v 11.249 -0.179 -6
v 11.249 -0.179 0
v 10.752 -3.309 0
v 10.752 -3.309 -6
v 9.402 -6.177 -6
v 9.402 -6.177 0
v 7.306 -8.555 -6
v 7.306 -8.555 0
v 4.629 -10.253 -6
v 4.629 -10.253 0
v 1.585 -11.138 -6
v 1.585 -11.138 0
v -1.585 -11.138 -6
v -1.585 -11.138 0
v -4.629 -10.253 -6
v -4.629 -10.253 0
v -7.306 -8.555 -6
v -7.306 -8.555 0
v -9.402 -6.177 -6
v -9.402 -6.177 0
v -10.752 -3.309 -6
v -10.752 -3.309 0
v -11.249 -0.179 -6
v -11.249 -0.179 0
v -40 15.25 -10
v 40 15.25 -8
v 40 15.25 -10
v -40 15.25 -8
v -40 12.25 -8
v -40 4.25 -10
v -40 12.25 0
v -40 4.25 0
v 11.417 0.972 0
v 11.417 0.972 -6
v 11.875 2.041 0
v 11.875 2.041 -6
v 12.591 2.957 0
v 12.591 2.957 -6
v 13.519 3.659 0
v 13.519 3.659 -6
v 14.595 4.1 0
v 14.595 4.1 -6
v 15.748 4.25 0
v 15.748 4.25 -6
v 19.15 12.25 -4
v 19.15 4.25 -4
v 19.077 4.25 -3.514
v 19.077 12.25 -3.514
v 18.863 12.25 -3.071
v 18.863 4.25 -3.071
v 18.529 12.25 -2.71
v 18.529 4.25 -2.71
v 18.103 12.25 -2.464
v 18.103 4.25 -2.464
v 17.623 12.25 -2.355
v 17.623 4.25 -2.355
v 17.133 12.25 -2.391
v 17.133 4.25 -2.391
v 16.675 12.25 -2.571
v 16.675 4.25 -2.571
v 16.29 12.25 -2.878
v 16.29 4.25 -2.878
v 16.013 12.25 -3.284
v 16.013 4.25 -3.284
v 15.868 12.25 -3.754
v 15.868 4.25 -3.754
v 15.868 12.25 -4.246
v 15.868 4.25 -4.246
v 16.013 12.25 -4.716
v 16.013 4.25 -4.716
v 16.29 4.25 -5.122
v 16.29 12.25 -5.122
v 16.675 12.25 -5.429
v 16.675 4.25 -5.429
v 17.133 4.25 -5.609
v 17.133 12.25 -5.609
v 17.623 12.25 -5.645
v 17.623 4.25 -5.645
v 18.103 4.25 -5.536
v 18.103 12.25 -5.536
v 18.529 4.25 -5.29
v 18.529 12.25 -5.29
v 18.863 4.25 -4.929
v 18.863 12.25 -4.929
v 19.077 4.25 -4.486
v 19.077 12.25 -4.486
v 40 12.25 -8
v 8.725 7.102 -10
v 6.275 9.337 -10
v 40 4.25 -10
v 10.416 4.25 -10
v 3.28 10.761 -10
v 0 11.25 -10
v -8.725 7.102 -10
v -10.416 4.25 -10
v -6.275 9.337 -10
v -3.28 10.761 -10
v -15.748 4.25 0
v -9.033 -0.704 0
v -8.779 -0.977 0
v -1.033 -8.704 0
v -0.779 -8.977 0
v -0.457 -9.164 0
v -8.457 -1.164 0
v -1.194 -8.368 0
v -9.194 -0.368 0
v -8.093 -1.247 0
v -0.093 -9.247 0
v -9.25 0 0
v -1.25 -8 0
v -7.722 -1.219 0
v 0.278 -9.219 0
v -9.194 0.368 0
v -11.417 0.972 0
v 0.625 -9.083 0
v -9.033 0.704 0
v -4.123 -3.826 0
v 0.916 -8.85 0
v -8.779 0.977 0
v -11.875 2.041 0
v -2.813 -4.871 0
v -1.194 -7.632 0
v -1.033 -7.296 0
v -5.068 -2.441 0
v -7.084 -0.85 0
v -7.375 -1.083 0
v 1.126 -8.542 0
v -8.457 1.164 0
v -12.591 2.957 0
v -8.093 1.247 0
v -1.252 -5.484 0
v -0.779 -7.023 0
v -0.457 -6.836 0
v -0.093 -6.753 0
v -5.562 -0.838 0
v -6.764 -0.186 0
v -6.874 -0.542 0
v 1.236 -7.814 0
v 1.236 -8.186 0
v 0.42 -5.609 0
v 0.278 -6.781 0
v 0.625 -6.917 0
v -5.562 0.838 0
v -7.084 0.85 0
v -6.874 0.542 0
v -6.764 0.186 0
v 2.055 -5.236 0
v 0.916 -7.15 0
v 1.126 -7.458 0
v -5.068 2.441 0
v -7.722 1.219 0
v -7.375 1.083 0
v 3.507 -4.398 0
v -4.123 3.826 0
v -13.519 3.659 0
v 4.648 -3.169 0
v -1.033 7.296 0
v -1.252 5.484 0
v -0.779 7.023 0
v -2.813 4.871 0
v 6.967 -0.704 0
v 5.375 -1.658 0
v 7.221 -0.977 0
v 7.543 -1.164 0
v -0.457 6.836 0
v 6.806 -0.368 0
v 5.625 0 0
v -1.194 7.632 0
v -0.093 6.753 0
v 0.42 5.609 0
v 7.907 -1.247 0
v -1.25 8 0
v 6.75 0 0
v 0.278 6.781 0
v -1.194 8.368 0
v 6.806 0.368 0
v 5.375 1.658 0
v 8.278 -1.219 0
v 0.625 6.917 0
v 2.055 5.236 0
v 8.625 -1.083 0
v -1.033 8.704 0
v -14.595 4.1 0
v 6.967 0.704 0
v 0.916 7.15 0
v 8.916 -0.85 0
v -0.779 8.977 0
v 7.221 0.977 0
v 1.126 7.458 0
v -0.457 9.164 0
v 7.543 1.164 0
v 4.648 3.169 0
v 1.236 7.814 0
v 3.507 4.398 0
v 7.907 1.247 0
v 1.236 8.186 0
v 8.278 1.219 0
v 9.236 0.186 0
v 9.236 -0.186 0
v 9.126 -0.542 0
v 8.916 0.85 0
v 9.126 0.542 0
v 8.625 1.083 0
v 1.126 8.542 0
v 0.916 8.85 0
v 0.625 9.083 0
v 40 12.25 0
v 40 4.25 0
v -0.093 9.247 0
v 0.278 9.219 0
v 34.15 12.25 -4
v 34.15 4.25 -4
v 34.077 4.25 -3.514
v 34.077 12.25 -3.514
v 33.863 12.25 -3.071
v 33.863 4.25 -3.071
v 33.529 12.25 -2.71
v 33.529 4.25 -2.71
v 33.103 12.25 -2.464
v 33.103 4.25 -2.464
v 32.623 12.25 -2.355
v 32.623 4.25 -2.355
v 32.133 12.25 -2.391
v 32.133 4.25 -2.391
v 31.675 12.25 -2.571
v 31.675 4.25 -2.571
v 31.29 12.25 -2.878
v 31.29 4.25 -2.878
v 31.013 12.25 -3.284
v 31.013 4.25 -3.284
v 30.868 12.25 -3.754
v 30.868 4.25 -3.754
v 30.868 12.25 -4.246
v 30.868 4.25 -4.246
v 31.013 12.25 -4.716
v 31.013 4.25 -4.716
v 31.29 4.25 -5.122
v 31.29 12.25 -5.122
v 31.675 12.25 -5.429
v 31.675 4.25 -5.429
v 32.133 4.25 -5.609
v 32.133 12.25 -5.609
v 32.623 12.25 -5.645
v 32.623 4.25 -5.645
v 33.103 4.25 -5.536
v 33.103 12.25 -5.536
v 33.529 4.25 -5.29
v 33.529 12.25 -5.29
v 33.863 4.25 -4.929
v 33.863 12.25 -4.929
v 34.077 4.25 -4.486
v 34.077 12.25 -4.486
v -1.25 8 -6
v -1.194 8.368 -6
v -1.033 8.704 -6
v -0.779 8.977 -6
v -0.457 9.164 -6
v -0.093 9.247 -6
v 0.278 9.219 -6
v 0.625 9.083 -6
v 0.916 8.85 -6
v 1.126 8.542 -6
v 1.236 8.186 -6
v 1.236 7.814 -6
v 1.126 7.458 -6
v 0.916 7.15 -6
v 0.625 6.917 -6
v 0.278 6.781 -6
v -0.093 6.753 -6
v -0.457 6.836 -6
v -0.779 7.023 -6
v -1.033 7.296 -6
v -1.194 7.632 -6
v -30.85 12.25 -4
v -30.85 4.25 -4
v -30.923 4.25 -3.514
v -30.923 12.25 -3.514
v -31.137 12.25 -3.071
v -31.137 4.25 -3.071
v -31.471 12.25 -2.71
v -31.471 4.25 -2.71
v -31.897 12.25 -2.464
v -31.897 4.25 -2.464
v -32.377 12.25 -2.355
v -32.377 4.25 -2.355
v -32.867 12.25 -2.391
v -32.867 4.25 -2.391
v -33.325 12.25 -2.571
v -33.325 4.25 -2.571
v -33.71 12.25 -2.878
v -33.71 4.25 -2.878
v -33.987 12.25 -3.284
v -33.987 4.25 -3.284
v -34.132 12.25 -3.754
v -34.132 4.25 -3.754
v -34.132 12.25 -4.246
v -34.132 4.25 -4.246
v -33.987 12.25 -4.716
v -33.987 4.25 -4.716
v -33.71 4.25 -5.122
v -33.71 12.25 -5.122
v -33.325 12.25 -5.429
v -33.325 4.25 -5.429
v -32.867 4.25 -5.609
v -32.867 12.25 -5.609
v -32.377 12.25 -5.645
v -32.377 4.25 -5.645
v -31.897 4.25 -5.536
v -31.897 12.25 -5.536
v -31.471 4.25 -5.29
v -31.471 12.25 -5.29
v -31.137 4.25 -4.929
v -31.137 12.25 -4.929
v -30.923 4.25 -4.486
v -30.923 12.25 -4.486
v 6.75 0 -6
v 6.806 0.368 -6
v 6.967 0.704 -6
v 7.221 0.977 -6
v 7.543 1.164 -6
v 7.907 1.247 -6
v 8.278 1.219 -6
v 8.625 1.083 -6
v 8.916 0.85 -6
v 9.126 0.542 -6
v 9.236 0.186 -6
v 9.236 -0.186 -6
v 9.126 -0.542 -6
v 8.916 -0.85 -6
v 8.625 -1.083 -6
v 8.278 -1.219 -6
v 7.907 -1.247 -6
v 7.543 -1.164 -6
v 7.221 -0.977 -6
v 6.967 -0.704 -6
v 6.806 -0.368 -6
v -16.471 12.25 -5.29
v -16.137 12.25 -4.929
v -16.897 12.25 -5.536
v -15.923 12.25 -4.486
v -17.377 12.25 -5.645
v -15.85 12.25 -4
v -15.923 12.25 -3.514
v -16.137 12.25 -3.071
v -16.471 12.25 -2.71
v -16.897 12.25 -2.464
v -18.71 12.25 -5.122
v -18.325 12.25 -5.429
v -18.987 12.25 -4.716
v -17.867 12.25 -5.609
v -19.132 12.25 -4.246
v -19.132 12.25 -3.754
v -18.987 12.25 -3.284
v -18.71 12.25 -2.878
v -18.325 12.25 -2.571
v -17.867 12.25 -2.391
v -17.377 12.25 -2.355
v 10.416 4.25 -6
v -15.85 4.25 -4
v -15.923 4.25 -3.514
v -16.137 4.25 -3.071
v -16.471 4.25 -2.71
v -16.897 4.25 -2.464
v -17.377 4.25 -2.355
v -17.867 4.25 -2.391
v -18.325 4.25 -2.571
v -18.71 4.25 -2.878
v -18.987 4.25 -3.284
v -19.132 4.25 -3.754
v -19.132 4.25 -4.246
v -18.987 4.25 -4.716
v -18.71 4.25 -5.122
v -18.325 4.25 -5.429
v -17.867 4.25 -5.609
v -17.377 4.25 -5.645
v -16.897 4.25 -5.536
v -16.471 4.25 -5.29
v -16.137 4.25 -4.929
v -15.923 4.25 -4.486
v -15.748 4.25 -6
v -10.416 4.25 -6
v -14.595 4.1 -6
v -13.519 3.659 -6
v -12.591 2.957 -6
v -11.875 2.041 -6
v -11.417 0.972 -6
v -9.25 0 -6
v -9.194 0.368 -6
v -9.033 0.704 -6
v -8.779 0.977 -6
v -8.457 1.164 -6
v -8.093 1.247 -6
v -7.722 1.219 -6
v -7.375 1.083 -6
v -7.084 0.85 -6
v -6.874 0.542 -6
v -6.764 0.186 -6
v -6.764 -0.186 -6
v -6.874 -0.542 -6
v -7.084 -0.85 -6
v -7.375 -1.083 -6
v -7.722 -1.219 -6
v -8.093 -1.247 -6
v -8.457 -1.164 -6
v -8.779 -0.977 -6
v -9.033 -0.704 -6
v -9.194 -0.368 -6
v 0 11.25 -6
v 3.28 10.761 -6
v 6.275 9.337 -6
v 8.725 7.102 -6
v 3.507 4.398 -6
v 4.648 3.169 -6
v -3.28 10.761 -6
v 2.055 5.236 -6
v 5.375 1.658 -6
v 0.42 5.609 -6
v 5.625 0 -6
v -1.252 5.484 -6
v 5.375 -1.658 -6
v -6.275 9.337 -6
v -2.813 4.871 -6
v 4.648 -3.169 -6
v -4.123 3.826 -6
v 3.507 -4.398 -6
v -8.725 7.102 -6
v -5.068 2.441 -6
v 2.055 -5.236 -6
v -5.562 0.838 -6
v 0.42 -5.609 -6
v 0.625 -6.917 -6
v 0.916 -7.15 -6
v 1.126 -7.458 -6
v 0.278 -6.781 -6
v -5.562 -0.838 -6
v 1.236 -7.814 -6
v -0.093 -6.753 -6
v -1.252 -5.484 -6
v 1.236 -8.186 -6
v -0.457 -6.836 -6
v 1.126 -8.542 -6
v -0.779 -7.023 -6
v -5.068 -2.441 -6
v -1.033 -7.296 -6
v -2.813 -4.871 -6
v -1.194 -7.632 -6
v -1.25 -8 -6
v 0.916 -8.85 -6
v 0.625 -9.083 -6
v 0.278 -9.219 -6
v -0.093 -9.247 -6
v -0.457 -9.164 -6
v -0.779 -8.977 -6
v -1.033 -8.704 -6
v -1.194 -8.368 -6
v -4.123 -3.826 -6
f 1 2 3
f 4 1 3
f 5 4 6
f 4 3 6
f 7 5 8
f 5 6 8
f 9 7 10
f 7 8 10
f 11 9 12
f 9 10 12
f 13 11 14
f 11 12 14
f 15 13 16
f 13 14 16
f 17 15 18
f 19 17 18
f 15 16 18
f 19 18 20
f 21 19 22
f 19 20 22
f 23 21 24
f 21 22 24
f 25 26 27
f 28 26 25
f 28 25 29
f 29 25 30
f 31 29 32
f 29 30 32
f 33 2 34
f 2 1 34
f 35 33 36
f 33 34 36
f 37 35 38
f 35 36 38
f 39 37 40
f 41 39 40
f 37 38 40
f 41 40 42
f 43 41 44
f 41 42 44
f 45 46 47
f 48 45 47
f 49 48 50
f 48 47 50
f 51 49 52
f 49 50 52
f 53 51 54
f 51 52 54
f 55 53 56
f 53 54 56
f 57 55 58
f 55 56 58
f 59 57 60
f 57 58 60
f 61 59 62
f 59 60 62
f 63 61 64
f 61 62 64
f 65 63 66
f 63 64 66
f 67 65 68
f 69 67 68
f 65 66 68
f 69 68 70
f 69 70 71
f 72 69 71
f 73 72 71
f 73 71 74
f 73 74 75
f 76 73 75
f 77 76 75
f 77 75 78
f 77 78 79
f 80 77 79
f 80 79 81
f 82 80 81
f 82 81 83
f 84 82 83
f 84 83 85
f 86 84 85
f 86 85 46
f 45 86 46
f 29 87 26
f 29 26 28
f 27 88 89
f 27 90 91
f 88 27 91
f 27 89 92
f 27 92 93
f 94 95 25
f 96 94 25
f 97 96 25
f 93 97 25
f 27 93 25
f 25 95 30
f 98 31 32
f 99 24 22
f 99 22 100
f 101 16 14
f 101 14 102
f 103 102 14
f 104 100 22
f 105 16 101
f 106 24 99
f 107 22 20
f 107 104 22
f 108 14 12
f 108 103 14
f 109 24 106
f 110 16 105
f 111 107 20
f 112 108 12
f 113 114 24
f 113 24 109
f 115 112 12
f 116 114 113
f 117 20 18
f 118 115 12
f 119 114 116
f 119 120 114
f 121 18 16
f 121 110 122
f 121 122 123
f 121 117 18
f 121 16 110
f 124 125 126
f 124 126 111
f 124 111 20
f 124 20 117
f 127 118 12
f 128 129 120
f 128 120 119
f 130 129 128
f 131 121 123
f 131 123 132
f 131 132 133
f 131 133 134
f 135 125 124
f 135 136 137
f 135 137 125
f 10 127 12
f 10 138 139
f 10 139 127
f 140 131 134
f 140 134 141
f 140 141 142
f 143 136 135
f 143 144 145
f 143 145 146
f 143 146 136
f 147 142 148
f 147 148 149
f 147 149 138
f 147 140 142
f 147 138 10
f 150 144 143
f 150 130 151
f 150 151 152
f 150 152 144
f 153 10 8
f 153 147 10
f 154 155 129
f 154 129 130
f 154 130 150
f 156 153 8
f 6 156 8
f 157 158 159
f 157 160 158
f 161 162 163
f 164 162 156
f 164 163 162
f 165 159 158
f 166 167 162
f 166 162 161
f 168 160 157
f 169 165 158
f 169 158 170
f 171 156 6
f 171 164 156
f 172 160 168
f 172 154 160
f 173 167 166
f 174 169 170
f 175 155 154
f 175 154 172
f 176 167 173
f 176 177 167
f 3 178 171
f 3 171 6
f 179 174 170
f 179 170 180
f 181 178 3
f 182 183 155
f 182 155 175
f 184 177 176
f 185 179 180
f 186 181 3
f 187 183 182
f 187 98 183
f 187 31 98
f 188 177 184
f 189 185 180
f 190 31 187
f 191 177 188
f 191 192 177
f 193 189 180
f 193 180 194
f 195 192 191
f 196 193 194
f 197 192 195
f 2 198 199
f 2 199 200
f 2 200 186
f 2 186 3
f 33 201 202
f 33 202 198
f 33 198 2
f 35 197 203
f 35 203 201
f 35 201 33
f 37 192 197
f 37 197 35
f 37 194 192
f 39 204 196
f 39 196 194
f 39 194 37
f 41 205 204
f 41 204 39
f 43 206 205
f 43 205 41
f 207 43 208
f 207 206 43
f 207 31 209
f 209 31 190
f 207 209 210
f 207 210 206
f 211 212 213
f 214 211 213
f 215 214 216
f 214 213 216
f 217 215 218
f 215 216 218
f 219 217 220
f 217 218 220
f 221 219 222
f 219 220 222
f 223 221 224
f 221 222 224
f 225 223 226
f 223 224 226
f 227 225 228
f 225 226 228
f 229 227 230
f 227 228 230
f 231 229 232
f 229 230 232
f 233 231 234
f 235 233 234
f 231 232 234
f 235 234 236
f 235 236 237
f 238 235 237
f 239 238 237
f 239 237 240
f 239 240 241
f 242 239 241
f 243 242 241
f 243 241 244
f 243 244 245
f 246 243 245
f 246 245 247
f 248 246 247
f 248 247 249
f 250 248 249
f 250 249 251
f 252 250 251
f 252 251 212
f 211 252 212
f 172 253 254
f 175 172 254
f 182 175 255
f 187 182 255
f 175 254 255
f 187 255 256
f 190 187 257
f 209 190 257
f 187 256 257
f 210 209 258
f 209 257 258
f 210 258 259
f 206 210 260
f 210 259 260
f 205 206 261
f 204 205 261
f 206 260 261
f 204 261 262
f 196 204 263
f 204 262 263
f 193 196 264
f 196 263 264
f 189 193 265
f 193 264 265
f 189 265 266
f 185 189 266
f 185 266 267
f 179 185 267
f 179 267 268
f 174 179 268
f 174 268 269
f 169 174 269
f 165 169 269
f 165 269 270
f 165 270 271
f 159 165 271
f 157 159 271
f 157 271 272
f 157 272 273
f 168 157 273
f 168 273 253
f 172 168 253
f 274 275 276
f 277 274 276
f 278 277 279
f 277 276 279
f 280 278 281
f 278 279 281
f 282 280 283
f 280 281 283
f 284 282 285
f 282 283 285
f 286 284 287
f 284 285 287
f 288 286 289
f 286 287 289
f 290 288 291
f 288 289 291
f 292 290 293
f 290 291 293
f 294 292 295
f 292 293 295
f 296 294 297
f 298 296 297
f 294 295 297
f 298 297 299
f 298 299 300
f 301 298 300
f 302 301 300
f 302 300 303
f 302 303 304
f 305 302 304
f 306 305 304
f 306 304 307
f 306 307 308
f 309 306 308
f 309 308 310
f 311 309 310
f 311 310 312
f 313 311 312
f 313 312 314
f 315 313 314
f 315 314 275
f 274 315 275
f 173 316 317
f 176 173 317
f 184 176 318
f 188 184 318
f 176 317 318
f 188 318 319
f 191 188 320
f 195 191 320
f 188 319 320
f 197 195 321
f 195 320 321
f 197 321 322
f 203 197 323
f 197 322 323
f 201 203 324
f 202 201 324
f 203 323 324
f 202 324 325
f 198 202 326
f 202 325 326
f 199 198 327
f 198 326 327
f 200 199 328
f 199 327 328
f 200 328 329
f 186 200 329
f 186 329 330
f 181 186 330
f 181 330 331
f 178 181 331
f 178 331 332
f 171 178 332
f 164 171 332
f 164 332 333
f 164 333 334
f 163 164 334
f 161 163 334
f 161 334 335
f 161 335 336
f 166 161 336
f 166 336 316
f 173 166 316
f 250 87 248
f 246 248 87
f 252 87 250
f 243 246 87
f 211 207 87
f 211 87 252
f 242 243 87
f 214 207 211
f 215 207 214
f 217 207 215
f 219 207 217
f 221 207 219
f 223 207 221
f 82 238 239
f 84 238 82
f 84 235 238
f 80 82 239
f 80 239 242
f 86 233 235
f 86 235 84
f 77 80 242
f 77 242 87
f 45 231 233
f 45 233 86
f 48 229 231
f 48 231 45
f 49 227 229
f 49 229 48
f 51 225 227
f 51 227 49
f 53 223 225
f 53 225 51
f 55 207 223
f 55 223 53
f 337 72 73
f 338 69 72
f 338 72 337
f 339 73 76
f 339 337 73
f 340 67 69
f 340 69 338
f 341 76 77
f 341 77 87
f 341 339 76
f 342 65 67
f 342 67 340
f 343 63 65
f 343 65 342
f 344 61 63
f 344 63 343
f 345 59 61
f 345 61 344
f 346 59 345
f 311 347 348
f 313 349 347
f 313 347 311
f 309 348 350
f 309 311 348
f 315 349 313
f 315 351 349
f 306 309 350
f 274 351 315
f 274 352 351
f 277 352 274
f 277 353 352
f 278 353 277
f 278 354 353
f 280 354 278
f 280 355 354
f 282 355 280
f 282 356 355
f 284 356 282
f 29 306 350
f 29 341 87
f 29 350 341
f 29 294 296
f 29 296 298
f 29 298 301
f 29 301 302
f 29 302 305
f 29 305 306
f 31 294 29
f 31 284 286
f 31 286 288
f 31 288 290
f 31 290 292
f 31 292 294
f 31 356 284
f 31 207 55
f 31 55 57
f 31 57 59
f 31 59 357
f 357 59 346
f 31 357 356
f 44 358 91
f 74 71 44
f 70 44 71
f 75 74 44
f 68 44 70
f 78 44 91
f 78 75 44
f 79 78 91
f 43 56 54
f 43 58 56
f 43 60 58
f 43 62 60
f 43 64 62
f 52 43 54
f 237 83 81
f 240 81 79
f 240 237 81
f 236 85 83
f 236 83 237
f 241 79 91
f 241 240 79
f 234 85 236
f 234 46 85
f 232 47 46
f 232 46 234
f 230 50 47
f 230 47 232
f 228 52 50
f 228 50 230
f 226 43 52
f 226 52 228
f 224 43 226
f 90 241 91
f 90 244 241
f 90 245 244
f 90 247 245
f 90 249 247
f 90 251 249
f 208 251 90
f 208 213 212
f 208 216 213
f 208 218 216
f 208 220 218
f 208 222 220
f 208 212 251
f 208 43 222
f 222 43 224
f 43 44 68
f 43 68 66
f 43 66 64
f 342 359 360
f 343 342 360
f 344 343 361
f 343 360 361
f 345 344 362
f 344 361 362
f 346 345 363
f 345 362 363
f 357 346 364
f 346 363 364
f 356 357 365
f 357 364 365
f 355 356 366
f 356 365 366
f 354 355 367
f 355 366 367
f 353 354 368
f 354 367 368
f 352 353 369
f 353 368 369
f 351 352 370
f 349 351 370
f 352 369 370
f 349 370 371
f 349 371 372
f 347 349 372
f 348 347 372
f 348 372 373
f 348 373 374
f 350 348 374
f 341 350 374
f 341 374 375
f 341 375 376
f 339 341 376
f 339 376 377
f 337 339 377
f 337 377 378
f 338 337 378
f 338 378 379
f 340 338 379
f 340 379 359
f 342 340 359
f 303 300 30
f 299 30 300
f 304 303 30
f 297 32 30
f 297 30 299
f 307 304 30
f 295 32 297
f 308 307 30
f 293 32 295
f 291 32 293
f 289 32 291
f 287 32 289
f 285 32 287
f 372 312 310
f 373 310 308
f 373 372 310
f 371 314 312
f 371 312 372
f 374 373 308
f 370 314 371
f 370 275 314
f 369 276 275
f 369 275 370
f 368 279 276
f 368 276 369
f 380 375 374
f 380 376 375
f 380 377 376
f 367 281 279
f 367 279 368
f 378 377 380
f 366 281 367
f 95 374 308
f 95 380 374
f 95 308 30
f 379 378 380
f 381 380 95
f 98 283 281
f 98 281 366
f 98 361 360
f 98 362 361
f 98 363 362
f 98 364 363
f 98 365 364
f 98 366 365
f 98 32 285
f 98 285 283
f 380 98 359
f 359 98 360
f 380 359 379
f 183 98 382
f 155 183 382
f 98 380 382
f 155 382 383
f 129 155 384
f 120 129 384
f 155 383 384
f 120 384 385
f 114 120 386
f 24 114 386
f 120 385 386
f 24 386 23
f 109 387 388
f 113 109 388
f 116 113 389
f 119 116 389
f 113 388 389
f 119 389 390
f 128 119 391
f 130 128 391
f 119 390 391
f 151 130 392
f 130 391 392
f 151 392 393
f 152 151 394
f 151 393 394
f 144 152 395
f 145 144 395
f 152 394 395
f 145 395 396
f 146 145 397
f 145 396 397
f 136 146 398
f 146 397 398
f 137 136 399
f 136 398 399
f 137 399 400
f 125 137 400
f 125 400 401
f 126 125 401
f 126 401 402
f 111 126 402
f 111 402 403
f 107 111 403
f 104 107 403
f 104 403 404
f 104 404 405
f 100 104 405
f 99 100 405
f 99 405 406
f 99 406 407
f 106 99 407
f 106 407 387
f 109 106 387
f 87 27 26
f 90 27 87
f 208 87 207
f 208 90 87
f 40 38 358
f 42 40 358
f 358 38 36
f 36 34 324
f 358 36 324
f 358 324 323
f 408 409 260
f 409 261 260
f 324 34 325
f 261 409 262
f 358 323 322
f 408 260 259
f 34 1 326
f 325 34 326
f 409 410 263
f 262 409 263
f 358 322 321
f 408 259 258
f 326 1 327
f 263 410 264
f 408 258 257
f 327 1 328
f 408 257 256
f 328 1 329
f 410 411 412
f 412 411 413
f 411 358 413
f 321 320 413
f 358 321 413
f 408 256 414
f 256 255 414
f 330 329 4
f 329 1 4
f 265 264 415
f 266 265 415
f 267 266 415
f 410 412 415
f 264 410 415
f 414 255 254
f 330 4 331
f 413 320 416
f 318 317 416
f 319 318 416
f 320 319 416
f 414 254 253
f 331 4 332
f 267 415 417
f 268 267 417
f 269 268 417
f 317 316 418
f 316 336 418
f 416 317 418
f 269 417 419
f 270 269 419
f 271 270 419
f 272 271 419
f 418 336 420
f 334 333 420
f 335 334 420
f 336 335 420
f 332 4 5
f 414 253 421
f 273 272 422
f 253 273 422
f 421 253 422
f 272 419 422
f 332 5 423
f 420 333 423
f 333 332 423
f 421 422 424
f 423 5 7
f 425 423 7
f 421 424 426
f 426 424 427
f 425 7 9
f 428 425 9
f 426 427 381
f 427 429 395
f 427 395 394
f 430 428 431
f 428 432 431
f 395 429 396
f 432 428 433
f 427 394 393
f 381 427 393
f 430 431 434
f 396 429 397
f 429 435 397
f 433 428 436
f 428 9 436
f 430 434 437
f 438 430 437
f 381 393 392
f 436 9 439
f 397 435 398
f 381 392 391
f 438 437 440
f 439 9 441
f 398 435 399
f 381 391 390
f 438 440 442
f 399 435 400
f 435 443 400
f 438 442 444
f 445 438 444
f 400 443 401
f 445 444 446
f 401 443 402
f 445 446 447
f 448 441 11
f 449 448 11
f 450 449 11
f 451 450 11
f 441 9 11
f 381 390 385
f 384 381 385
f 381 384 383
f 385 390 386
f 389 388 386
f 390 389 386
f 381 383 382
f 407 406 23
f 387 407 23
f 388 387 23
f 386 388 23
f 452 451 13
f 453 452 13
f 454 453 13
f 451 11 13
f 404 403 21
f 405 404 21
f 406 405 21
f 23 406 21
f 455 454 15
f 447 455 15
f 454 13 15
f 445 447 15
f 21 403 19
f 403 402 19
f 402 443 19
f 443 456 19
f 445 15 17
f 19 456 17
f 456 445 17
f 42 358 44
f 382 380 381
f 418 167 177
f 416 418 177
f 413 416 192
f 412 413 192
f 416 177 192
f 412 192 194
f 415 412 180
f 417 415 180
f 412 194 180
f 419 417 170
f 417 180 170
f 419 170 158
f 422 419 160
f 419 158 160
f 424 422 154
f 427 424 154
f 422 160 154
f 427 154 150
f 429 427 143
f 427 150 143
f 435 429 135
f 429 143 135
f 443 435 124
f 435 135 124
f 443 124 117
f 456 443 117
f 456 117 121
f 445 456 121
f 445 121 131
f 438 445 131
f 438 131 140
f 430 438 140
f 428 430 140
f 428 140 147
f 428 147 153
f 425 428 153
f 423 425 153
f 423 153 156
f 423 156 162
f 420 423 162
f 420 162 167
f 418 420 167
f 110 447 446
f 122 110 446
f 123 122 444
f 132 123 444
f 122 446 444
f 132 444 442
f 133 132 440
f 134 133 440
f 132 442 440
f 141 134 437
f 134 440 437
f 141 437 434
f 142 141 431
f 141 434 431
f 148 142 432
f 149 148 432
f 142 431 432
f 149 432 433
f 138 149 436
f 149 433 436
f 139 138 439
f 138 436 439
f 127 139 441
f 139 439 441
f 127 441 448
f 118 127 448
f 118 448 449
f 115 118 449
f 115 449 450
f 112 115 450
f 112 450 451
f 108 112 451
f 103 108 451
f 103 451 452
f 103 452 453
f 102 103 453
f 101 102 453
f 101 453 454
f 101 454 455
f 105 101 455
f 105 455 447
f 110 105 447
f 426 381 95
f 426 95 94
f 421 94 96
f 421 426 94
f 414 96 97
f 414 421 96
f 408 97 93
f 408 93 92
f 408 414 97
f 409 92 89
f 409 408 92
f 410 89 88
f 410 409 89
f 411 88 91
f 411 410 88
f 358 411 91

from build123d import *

# Parameters (mm, degrees)
F4_D      = 2.5
F3_R      = 5.625
F5_DEPTH  = 18.001
F7_DEPTH  = 10
F8_R      = 4.5
F9_W      = 80
F9_H      = 2
F10_DEPTH = 3
F12_D     = 3.3


with BuildPart() as f1:
    # F0 (on Front) → F1 (revolve)
    with BuildSketch(Plane.XZ):
        Polygon((5.125, 1.85), (3.5, 1.85), (3.5, -16.15), (5.125, -16.15), (5.125, -6), (11.25, -6), (11.25, 0), (5.125, 0), align=None)
    revolve(axis=Axis((0, 0, -12.1311874992), (0, 0, -1)))

    # F4 (through all)
    with Locations(Plane.XY):
        with Locations((0, 8), (8, 0), (0, -8), (-8, 0)):
            Hole(F4_D / 2)

    # F3 (on face) → F5 (cut, through all)
    with BuildSketch(Plane.XY.offset(1.85)):
        Circle(F3_R)
    extrude(amount=-F5_DEPTH, mode=Mode.SUBTRACT)

    # F6 (on face) → F7 (join)
    with BuildSketch(Plane.XY):
        with BuildLine():
            ThreePointArc((-10.416333328, 4.25), (0, 11.25), (10.416333328, 4.25))
            Line((10.416333328, 4.25), (40, 4.25))
            Line((40, 4.25), (40, 12.25))
            Line((40, 12.25), (-40, 12.25))
            Line((-40, 12.25), (-40, 4.25))
            Line((-40, 4.25), (-10.416333328, 4.25))
        make_face()
    extrude(amount=-F7_DEPTH)

    # F8
    f8_edges = [f1.edges().sort_by_distance(p)[0] for p in [
        (10.416333, 4.25, -3),
        (-10.416333, 4.25, -3),
    ]]
    fillet(f8_edges, radius=F8_R)

    # F9 (on face) → F10 (join)
    with BuildSketch(Plane(origin=(0, 12.25, 0), x_dir=(-1, 0, 0), z_dir=(0, 1, 0))):
        with Locations((0, -9)):
            Rectangle(F9_W, F9_H)
    extrude(amount=F10_DEPTH)

    # F12 (through all)
    with Locations(Plane(origin=(0, 12.25, 0), x_dir=(-1, 0, 0), z_dir=(0, 1, 0))):
        with Locations((-32.5, -4), (-17.5, -4), (17.5, -4), (32.5, -4)):
            Hole(F12_D / 2)


solid = f1.part
